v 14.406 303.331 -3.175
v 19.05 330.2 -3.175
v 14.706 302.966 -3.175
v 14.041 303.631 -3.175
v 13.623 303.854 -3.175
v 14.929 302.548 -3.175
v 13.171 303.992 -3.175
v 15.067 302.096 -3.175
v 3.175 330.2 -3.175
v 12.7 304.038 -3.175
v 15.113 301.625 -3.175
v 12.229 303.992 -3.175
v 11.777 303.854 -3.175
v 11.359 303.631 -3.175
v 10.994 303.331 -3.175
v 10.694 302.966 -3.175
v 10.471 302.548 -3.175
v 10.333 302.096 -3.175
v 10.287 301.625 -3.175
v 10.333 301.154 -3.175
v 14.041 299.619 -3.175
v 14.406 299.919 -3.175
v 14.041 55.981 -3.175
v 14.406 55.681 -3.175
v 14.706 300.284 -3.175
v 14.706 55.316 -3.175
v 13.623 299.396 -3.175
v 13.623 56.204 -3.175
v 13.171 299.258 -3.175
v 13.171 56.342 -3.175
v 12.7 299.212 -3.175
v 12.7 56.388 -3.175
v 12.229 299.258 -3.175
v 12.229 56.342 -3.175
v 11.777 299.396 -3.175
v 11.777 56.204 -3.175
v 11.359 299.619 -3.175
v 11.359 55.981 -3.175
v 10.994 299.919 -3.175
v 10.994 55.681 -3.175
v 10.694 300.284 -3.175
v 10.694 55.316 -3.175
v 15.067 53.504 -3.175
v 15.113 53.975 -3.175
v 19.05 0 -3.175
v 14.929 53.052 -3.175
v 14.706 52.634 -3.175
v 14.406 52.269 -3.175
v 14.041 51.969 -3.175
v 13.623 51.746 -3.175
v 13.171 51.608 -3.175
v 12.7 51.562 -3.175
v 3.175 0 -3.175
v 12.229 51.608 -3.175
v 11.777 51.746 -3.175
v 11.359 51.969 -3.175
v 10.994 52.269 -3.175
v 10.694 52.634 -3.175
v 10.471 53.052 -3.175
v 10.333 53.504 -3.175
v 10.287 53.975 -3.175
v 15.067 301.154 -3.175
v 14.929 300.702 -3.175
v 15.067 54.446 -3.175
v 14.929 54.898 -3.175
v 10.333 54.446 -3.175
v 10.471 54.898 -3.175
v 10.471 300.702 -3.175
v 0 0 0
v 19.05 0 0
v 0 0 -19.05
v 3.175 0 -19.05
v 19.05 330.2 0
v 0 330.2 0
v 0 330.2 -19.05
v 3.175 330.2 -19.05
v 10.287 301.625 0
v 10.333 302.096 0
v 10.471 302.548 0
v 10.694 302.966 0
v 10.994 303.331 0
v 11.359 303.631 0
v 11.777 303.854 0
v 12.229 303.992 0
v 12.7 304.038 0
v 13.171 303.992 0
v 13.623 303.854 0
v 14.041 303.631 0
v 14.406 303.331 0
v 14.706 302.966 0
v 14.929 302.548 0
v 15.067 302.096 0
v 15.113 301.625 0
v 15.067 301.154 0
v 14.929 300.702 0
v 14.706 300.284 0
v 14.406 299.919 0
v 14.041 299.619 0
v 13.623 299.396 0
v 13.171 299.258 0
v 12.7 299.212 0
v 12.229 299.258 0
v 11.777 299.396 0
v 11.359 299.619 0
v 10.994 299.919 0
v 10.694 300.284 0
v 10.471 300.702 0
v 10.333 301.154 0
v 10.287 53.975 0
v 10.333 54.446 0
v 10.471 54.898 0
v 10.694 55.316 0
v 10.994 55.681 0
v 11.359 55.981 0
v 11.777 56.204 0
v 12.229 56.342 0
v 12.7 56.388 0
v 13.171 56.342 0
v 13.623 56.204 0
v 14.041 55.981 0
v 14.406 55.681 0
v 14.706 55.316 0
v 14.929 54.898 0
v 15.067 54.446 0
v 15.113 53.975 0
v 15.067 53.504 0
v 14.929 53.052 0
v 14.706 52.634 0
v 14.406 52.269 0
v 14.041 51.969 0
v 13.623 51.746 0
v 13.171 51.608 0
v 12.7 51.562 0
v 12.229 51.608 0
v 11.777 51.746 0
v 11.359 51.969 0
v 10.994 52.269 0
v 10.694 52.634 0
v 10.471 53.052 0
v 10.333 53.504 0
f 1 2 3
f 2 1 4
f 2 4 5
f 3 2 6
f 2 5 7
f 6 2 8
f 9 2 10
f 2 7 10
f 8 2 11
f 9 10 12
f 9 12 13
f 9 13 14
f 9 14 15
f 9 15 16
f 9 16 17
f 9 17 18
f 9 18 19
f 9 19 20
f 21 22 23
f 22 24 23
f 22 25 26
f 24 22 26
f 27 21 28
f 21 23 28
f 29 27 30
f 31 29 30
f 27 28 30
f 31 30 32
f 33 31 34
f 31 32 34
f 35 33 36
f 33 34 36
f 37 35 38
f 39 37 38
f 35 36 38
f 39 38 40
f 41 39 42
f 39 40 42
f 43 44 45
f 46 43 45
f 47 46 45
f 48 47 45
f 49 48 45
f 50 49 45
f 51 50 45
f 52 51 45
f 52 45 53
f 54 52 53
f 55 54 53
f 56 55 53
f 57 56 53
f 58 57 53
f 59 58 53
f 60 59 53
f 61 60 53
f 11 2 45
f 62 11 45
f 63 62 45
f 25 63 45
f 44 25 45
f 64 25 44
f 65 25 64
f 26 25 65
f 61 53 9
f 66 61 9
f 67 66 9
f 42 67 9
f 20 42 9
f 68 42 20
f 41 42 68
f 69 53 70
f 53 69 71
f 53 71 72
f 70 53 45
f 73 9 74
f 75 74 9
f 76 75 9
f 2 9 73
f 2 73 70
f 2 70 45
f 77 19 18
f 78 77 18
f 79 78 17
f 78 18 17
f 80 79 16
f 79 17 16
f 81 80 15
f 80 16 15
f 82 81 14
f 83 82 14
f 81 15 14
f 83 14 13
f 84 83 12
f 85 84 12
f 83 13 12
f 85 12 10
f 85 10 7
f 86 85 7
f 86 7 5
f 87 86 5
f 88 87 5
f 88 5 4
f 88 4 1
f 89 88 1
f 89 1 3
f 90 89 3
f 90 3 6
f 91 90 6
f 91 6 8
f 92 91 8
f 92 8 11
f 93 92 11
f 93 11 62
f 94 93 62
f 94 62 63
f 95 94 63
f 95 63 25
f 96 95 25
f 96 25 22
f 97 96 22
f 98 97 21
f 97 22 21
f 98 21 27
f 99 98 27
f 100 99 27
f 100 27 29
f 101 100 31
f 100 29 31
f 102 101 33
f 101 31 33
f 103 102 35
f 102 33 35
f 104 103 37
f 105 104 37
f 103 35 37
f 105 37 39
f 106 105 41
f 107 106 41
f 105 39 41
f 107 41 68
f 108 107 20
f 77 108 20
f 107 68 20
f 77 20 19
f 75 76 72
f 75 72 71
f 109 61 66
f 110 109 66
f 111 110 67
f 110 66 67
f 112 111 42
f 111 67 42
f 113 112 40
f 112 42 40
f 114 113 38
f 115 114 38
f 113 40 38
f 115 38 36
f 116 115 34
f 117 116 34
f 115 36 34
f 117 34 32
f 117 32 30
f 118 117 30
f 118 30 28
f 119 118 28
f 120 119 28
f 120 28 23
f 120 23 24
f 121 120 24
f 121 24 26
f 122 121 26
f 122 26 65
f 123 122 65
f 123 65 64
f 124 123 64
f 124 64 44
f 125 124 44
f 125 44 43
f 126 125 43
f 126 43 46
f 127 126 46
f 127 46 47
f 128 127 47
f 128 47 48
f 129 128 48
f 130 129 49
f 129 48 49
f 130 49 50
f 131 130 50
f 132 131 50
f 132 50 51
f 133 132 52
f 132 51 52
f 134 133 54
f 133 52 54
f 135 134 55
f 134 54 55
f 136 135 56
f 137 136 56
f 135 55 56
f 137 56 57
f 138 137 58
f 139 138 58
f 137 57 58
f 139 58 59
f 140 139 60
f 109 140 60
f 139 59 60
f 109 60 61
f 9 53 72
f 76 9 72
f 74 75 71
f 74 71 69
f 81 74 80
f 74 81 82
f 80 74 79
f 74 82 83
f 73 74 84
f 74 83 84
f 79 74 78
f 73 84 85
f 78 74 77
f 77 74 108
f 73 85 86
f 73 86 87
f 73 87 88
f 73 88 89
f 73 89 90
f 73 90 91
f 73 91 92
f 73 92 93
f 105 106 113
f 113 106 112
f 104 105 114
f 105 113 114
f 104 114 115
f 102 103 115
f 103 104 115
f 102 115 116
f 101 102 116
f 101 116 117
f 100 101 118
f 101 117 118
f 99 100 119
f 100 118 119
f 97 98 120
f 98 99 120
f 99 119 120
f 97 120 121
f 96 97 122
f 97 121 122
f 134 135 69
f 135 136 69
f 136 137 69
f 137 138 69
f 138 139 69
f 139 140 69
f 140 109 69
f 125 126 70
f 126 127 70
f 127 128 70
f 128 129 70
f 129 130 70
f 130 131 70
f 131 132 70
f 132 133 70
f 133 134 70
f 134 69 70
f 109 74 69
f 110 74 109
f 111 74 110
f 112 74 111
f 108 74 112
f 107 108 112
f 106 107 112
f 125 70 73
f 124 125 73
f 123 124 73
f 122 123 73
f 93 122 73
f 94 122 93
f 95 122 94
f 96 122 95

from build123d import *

# Parameters (mm, degrees)
BOSS_EXTRUDE1_DEPTH = 330.2
CUT_EXTRUDE1_REACH  = 333.13
SKETCH2_R           = 2.413


with BuildPart() as part:
    # Sketch1 → Boss-Extrude1 (new body)
    with BuildSketch(Plane(origin=(0, 0, 0), x_dir=(1, 0, 0), z_dir=(0, 1, 0))):
        Polygon((3.175, 3.175), (3.175, 19.05), (0, 19.05), (0, 0), (19.05, 0), (19.05, 3.175), align=None)
    extrude(amount=BOSS_EXTRUDE1_DEPTH)

    # Sketch2 → Cut-Extrude1 (cut, up to next)
    with BuildSketch(Plane(origin=(0, 0, -3.175), x_dir=(-1, 0, 0), z_dir=(0, 0, -1)), mode=Mode.PRIVATE) as cut_extrude1_sk1:
        with Locations((-12.7, 53.975)):
            Circle(SKETCH2_R)
    cut_extrude1_tool1 = extrude(cut_extrude1_sk1.sketch, amount=-CUT_EXTRUDE1_REACH, mode=Mode.PRIVATE) & part.part
    # Sketch2 → Cut-Extrude1 (cut, up to next)
    with BuildSketch(Plane(origin=(0, 0, -3.175), x_dir=(-1, 0, 0), z_dir=(0, 0, -1)), mode=Mode.PRIVATE) as cut_extrude1_sk2:
        with Locations((-12.7, 301.625)):
            Circle(SKETCH2_R)
    cut_extrude1_tool2 = extrude(cut_extrude1_sk2.sketch, amount=-CUT_EXTRUDE1_REACH, mode=Mode.PRIVATE) & part.part
    add(cut_extrude1_tool1.solids().sort_by_distance((12.7, 53.975, -3.175))[0], mode=Mode.SUBTRACT)
    add(cut_extrude1_tool2.solids().sort_by_distance((12.7, 301.625, -3.175))[0], mode=Mode.SUBTRACT)


solid = part.part
